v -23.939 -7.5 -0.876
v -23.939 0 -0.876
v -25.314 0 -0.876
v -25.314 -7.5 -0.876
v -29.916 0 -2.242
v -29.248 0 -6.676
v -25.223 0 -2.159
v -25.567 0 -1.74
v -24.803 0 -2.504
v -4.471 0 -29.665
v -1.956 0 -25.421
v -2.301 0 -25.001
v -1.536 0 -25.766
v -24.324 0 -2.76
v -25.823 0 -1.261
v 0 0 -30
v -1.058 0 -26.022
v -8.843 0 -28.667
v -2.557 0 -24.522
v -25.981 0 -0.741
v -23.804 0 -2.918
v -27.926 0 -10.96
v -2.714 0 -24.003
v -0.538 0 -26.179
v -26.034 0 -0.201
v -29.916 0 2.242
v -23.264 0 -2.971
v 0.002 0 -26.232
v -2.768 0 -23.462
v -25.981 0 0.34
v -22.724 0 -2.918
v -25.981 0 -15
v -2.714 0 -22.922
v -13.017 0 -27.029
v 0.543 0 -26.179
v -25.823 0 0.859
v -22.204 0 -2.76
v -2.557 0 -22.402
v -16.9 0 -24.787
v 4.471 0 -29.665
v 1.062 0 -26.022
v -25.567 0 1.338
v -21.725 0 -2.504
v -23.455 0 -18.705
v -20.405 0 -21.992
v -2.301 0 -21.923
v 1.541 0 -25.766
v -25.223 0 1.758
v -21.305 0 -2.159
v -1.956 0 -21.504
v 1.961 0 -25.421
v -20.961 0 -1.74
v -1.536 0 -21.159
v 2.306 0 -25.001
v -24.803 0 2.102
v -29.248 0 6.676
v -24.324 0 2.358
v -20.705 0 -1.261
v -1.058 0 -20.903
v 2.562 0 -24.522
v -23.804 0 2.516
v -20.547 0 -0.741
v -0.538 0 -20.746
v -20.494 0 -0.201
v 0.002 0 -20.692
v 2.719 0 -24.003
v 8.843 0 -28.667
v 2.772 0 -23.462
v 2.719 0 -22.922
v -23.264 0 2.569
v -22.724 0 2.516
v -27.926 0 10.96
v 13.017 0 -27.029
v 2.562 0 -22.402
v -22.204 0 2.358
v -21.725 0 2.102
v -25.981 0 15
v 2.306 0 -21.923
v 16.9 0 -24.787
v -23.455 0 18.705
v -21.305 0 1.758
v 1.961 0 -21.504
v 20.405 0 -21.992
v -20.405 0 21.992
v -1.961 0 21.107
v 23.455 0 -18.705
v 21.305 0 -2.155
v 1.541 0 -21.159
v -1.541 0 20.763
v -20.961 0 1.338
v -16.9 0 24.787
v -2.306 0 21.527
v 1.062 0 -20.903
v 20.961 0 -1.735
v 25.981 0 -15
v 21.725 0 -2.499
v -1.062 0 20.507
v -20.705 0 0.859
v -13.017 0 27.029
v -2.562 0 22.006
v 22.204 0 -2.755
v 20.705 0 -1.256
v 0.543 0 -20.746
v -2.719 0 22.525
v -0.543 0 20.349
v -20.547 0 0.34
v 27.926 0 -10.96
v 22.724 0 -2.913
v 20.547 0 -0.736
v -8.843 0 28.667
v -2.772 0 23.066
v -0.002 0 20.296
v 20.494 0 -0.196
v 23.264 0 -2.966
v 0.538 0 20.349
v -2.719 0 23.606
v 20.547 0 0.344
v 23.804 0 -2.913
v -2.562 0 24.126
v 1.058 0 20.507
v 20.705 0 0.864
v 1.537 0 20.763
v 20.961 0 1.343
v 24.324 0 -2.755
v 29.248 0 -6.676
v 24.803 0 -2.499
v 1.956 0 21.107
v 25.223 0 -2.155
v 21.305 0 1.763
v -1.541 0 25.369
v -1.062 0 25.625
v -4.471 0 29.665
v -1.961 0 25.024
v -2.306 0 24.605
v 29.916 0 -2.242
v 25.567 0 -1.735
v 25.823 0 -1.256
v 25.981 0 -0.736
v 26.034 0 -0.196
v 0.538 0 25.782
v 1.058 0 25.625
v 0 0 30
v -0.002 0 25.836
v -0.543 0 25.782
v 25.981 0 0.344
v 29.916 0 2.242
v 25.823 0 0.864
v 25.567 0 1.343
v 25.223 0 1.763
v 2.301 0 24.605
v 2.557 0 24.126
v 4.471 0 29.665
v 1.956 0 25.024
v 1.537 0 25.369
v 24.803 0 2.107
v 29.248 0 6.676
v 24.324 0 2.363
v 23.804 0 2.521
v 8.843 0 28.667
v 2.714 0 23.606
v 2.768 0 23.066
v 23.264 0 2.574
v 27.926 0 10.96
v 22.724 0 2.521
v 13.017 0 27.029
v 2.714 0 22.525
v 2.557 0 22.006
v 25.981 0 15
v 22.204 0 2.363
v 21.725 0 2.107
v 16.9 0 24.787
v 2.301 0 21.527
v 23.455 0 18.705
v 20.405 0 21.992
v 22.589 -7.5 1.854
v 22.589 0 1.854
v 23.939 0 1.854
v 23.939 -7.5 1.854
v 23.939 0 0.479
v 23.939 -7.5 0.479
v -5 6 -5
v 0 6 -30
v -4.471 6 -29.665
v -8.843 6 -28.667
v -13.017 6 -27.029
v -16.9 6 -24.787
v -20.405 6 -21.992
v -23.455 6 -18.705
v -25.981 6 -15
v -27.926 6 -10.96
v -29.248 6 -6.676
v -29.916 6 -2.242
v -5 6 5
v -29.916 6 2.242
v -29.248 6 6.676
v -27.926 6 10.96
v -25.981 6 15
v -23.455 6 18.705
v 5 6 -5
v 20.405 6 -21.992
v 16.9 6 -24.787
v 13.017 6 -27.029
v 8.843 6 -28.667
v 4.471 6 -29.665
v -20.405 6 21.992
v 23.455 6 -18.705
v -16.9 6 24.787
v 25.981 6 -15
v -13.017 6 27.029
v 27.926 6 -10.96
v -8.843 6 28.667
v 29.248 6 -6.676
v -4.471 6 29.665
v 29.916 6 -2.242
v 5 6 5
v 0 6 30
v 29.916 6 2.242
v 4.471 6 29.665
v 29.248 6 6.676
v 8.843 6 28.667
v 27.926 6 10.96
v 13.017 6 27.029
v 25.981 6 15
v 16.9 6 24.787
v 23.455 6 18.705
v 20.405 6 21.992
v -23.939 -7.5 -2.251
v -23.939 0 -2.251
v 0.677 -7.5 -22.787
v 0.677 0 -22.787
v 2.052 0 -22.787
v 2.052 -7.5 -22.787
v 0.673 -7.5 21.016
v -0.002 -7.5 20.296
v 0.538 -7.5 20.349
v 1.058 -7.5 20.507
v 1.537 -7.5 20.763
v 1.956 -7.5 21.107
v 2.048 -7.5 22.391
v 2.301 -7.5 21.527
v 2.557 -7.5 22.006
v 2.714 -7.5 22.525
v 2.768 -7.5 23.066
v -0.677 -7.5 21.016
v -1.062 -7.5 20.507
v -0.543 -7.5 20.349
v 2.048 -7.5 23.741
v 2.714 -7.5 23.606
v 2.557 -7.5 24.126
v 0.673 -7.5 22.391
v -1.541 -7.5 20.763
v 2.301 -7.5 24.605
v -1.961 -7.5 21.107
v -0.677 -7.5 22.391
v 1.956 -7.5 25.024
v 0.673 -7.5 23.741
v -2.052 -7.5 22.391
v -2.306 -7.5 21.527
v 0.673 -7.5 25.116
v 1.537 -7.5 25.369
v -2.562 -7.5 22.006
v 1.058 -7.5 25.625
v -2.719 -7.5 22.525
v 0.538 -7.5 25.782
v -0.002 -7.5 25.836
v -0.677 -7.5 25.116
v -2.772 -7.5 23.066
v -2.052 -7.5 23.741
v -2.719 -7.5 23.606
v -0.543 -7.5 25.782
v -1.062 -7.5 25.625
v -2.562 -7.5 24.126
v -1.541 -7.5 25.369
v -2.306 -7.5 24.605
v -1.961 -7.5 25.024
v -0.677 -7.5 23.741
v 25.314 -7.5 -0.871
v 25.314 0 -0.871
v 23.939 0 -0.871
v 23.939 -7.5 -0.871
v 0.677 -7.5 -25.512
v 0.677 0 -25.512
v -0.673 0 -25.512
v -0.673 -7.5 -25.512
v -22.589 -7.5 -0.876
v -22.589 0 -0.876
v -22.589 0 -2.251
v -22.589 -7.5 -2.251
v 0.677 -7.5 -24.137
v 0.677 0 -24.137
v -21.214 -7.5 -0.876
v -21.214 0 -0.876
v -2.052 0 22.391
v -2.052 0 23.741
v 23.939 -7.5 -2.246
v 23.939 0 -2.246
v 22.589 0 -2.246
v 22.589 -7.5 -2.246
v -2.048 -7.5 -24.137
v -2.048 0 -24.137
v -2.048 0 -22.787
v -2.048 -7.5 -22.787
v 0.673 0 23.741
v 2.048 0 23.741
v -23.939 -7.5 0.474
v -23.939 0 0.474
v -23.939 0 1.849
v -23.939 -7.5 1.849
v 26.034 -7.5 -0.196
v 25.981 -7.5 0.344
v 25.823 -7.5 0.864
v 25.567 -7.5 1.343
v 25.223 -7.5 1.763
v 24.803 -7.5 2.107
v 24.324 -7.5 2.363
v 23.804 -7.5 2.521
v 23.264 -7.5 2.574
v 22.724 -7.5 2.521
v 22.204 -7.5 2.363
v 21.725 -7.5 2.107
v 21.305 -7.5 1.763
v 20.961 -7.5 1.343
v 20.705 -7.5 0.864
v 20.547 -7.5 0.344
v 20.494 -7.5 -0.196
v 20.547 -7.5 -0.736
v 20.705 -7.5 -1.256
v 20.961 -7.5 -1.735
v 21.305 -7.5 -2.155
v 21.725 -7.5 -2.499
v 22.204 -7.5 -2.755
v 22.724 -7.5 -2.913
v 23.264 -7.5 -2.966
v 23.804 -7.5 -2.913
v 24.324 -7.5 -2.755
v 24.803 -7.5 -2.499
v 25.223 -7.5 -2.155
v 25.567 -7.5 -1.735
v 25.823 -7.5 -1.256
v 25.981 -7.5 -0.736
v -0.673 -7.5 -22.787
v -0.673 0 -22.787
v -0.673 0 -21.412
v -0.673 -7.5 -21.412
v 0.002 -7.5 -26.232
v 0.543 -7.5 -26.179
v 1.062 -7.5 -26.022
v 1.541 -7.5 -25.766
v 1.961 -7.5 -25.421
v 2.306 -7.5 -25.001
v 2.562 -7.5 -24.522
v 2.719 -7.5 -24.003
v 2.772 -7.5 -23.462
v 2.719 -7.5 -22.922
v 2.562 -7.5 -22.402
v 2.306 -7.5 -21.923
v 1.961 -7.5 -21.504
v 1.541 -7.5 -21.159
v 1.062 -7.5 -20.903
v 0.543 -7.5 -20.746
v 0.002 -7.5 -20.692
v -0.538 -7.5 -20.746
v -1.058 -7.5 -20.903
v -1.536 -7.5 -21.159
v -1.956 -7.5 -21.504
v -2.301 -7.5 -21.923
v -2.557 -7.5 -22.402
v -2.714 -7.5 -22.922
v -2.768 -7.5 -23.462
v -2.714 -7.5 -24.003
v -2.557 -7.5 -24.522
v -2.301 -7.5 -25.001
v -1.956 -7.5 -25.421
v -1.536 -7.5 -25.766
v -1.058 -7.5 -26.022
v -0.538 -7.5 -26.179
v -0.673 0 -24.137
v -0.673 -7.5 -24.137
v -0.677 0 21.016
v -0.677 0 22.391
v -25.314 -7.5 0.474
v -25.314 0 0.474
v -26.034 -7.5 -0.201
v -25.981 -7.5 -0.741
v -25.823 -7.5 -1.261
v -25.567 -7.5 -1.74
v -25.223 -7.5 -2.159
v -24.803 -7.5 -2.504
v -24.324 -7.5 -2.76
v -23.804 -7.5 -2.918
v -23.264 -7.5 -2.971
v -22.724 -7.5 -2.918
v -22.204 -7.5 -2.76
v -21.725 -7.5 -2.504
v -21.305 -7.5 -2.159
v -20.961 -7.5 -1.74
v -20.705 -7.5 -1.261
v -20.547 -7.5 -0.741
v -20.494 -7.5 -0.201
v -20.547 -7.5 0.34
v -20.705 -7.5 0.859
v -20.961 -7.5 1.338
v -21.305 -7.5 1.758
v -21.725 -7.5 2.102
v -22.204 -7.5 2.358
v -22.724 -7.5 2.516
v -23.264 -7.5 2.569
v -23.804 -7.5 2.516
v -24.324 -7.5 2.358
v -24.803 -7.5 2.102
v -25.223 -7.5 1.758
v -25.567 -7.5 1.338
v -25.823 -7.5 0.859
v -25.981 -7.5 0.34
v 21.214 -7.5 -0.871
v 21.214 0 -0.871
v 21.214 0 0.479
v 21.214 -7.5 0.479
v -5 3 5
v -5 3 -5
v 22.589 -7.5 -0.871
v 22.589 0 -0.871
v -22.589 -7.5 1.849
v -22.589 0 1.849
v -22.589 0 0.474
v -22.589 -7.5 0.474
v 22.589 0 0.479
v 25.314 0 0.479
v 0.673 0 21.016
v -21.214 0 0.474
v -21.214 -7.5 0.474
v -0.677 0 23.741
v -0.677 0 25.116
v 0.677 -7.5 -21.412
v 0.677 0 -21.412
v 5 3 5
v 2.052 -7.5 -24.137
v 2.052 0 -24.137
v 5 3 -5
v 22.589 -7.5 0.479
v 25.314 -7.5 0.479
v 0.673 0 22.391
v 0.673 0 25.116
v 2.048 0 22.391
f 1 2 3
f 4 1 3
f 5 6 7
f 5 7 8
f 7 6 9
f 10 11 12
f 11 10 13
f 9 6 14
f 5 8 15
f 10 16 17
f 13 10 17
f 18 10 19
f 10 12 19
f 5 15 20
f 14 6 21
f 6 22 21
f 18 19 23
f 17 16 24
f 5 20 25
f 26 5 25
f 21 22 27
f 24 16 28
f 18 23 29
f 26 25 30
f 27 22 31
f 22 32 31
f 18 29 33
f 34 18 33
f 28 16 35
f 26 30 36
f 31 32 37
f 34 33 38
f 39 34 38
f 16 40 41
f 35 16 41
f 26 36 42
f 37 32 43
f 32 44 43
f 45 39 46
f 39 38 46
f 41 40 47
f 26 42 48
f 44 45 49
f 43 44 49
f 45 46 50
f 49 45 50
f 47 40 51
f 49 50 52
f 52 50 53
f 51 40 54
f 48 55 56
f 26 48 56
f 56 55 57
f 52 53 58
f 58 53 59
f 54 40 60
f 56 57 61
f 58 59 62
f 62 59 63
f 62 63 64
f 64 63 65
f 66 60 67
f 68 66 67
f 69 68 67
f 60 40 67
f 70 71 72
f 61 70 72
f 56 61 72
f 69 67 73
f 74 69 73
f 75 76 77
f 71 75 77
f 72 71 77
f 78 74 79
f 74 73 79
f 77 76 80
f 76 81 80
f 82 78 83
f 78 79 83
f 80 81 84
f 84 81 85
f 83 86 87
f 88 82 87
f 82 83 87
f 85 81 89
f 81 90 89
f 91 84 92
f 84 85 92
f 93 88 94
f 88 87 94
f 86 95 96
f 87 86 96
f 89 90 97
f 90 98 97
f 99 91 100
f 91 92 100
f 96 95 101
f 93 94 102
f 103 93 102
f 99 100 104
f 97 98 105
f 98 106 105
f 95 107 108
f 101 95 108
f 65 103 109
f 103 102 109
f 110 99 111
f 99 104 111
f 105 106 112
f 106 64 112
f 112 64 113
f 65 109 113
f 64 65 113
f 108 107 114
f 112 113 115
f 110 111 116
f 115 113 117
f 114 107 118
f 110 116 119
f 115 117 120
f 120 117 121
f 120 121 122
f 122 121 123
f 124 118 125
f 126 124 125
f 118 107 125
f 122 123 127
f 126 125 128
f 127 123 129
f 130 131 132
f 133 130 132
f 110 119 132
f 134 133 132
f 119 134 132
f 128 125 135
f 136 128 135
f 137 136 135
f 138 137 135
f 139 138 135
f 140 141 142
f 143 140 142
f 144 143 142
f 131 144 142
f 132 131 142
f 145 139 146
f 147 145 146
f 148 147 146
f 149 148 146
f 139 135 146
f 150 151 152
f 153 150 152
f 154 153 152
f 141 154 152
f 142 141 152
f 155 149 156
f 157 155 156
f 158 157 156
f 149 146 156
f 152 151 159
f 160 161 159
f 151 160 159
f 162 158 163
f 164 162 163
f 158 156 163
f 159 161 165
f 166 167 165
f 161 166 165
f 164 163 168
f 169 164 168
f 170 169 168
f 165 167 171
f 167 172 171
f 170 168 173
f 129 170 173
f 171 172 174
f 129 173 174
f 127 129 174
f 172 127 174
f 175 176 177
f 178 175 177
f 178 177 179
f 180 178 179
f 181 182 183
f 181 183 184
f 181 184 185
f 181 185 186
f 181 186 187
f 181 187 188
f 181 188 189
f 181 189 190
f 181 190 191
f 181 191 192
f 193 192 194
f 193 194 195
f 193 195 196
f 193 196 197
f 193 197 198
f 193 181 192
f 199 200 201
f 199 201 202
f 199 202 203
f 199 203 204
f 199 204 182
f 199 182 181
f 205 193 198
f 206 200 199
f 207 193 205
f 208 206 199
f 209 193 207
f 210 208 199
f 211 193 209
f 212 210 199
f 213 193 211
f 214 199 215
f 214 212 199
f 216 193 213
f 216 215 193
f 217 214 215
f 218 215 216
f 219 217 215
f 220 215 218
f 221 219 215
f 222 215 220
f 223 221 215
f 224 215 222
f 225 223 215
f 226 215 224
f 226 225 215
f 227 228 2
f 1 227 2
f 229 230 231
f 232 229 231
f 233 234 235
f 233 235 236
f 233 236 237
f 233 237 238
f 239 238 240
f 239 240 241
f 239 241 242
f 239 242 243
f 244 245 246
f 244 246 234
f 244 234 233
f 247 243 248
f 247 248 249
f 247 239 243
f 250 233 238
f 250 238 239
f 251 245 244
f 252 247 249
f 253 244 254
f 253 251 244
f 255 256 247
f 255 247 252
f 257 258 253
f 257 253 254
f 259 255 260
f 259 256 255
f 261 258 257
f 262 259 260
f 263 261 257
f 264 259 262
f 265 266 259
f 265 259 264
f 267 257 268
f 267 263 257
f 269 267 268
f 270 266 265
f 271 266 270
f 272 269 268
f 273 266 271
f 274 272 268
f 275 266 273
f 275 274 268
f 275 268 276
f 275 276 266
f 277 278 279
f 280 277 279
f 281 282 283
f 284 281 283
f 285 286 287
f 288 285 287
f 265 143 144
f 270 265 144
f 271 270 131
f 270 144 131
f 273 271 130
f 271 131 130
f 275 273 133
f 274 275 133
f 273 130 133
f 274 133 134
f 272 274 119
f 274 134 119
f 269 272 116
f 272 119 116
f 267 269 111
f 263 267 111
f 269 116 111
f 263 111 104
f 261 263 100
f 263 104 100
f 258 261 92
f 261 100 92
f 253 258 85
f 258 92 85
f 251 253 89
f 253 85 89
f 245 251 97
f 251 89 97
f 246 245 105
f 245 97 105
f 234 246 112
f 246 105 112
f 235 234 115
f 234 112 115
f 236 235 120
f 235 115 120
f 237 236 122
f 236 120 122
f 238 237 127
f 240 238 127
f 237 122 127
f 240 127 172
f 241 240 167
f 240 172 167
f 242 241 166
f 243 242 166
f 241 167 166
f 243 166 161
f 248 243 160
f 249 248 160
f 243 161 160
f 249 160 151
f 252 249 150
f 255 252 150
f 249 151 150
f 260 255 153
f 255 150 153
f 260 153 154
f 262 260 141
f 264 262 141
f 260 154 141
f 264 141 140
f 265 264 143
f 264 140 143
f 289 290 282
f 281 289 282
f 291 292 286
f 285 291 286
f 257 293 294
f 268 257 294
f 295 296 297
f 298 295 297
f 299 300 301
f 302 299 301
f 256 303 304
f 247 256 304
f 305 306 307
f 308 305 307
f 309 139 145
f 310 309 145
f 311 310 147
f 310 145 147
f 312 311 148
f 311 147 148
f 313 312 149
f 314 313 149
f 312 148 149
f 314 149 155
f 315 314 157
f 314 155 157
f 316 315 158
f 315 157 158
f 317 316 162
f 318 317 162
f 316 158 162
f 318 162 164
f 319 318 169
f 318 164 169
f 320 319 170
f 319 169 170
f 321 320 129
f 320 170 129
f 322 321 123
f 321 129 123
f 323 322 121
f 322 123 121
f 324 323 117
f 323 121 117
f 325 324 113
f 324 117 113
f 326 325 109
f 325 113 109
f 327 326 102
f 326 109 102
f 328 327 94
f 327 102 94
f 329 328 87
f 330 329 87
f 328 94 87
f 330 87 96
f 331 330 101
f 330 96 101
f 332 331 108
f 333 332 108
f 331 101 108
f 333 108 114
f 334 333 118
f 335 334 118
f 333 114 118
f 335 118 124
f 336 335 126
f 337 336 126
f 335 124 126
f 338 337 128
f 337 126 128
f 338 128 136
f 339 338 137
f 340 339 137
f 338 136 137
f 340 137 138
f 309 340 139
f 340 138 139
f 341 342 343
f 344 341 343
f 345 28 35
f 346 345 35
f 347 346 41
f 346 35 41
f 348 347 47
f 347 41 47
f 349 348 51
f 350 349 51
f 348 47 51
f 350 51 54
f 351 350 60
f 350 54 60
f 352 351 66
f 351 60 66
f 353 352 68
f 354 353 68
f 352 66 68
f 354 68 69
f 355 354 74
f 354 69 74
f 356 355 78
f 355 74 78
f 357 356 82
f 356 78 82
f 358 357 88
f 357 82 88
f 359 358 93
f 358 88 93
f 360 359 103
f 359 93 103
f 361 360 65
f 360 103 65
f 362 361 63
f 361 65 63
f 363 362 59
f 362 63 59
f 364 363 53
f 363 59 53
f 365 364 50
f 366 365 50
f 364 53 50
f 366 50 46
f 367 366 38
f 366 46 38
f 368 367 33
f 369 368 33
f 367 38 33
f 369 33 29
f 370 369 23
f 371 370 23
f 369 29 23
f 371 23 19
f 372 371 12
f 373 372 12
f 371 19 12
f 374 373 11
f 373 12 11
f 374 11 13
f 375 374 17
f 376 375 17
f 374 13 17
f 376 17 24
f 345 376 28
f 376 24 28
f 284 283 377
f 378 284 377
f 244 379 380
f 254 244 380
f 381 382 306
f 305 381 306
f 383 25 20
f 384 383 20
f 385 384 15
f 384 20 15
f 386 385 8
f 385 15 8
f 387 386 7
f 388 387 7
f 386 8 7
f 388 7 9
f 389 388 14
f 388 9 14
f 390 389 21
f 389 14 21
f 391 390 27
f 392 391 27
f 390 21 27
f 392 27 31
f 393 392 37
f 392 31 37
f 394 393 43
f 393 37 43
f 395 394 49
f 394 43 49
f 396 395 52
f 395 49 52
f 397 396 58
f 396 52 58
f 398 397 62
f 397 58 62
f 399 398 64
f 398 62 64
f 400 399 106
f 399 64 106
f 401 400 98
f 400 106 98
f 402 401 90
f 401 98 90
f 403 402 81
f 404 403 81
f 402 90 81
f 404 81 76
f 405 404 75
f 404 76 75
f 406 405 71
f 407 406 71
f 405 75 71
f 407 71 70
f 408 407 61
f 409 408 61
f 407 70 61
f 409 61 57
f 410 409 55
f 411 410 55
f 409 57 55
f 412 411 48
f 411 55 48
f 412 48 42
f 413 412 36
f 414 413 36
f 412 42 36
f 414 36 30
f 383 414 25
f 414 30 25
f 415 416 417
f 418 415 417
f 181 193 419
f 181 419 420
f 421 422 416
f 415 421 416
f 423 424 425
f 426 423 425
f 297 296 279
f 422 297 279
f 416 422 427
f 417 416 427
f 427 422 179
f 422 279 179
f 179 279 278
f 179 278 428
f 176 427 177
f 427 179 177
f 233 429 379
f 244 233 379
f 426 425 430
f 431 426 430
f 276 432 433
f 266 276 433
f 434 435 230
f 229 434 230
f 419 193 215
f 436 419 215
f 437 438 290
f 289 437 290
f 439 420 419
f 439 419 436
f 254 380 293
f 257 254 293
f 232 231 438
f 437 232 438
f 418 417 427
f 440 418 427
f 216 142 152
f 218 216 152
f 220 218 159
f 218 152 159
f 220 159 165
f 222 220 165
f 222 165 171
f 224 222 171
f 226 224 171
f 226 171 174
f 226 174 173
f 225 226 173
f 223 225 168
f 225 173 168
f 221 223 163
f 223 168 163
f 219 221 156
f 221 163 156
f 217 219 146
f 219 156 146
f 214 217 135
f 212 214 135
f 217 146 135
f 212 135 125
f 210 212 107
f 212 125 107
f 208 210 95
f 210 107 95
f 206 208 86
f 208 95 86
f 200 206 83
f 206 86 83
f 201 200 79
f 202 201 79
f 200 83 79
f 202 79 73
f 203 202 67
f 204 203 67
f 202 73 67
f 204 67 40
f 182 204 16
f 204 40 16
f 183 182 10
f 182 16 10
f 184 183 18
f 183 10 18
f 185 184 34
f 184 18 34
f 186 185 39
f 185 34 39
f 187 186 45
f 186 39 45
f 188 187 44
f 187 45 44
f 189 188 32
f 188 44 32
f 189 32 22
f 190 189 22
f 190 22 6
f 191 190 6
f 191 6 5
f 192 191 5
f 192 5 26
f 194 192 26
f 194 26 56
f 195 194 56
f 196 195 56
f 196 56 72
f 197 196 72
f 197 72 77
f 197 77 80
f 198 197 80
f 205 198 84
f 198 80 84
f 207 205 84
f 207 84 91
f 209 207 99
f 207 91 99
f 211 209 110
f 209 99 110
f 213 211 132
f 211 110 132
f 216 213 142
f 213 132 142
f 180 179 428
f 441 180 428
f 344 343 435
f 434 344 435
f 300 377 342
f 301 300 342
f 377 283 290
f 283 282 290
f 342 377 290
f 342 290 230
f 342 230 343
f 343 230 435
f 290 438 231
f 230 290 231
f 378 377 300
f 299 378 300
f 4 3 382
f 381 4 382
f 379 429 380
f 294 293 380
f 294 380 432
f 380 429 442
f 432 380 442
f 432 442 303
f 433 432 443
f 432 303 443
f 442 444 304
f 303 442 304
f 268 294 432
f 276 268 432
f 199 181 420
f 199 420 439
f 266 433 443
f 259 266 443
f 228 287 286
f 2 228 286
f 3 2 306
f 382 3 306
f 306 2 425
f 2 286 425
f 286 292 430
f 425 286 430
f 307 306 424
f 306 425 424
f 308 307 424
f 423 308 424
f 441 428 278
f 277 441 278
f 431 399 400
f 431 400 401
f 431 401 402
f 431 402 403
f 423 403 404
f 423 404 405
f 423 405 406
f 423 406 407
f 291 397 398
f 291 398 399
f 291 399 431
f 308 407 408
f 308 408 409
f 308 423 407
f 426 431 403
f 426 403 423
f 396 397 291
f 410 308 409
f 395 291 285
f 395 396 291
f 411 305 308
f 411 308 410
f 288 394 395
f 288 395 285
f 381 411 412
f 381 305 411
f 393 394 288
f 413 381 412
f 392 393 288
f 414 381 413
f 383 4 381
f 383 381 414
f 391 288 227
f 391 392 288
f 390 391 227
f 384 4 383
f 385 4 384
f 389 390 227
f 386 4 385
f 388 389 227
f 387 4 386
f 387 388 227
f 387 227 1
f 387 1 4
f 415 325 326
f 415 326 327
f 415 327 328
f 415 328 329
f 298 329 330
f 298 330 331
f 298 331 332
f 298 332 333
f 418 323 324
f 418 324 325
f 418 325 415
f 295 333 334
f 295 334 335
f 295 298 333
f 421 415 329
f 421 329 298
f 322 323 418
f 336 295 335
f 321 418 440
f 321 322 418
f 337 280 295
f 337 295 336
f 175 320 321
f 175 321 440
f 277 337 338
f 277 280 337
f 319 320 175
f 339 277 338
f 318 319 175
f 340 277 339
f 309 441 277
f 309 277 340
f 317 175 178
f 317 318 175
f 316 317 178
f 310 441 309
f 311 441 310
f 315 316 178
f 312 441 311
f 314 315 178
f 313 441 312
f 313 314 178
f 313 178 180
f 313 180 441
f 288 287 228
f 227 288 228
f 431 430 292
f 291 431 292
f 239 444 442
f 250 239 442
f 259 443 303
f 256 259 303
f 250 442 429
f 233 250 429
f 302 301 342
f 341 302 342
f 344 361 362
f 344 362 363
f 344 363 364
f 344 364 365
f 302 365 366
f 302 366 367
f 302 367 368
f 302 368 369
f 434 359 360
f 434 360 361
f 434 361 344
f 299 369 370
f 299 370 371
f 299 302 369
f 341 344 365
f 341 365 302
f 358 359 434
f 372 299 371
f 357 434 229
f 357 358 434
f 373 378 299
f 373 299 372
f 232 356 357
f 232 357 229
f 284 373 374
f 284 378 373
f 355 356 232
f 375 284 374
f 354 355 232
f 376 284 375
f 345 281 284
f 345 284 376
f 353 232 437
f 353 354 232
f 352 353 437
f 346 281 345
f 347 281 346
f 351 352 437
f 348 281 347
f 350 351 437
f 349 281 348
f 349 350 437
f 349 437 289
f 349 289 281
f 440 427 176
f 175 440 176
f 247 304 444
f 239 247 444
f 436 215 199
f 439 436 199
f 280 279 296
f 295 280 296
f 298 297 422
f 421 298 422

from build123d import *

# Parameters (mm, degrees)
SKETCH1_R           = 30
BOSS_EXTRUDE1_DEPTH = 6
SKETCH6_R           = 2.77
BOSS_EXTRUDE3_DEPTH = 7.5
CIRPATTERN3_COUNT   = 4
SKETCH11_W          = 10
SKETCH11_H          = 10
CUT_EXTRUDE3_DEPTH  = 3


with BuildPart() as part:
    # Sketch1 → Boss-Extrude1 (new body)
    with BuildSketch(Plane(origin=(0, 0, 0), x_dir=(1, 0, 0), z_dir=(0, 1, 0))):
        with Locations(Location((0, 0, 0), (0, 0, 270))):
            Circle(SKETCH1_R)
    extrude(amount=BOSS_EXTRUDE1_DEPTH)

    # Sketch6 → Boss-Extrude3 (add)
    with BuildSketch(Plane(origin=(0, 0, -4.132474232), x_dir=(1, 0, 0), z_dir=(0, -1, 0))):
        with Locations(Location((-0.002388639, 27.198186003, 0), (0, 0, 90))):
            Circle(SKETCH6_R)
        Polygon((2.047611361, 27.873186003), (2.047611361, 26.523186003), (0.672611361, 26.523186003), (0.672611361, 25.148186003), (-0.677388639, 25.148186003), (-0.677388639, 26.523186003), (-2.052388639, 26.523186003), (-2.052388639, 27.873186003), (-0.677388639, 27.873186003), (-0.677388639, 29.248186003), (0.672611361, 29.248186003), (0.672611361, 27.873186003), align=None, mode=Mode.SUBTRACT)
    boss_extrude3 = extrude(amount=BOSS_EXTRUDE3_DEPTH)

    # CirPattern3: Boss-Extrude3 ×4 about axis
    cirpattern3_axis = Axis((2.0539e-05, 0, -0.19833635), (0, 1, 0))
    for i in range(1, CIRPATTERN3_COUNT):
        add(boss_extrude3.rotate(cirpattern3_axis, i * 360 / CIRPATTERN3_COUNT))

    # Sketch11 → Cut-Extrude3 (cut)
    with BuildSketch(Plane(origin=(0, 6, 0), x_dir=(1, 0, 0), z_dir=(0, 1, 0))):
        Rectangle(SKETCH11_W, SKETCH11_H)
    extrude(amount=-CUT_EXTRUDE3_DEPTH, mode=Mode.SUBTRACT)


solid = part.part
